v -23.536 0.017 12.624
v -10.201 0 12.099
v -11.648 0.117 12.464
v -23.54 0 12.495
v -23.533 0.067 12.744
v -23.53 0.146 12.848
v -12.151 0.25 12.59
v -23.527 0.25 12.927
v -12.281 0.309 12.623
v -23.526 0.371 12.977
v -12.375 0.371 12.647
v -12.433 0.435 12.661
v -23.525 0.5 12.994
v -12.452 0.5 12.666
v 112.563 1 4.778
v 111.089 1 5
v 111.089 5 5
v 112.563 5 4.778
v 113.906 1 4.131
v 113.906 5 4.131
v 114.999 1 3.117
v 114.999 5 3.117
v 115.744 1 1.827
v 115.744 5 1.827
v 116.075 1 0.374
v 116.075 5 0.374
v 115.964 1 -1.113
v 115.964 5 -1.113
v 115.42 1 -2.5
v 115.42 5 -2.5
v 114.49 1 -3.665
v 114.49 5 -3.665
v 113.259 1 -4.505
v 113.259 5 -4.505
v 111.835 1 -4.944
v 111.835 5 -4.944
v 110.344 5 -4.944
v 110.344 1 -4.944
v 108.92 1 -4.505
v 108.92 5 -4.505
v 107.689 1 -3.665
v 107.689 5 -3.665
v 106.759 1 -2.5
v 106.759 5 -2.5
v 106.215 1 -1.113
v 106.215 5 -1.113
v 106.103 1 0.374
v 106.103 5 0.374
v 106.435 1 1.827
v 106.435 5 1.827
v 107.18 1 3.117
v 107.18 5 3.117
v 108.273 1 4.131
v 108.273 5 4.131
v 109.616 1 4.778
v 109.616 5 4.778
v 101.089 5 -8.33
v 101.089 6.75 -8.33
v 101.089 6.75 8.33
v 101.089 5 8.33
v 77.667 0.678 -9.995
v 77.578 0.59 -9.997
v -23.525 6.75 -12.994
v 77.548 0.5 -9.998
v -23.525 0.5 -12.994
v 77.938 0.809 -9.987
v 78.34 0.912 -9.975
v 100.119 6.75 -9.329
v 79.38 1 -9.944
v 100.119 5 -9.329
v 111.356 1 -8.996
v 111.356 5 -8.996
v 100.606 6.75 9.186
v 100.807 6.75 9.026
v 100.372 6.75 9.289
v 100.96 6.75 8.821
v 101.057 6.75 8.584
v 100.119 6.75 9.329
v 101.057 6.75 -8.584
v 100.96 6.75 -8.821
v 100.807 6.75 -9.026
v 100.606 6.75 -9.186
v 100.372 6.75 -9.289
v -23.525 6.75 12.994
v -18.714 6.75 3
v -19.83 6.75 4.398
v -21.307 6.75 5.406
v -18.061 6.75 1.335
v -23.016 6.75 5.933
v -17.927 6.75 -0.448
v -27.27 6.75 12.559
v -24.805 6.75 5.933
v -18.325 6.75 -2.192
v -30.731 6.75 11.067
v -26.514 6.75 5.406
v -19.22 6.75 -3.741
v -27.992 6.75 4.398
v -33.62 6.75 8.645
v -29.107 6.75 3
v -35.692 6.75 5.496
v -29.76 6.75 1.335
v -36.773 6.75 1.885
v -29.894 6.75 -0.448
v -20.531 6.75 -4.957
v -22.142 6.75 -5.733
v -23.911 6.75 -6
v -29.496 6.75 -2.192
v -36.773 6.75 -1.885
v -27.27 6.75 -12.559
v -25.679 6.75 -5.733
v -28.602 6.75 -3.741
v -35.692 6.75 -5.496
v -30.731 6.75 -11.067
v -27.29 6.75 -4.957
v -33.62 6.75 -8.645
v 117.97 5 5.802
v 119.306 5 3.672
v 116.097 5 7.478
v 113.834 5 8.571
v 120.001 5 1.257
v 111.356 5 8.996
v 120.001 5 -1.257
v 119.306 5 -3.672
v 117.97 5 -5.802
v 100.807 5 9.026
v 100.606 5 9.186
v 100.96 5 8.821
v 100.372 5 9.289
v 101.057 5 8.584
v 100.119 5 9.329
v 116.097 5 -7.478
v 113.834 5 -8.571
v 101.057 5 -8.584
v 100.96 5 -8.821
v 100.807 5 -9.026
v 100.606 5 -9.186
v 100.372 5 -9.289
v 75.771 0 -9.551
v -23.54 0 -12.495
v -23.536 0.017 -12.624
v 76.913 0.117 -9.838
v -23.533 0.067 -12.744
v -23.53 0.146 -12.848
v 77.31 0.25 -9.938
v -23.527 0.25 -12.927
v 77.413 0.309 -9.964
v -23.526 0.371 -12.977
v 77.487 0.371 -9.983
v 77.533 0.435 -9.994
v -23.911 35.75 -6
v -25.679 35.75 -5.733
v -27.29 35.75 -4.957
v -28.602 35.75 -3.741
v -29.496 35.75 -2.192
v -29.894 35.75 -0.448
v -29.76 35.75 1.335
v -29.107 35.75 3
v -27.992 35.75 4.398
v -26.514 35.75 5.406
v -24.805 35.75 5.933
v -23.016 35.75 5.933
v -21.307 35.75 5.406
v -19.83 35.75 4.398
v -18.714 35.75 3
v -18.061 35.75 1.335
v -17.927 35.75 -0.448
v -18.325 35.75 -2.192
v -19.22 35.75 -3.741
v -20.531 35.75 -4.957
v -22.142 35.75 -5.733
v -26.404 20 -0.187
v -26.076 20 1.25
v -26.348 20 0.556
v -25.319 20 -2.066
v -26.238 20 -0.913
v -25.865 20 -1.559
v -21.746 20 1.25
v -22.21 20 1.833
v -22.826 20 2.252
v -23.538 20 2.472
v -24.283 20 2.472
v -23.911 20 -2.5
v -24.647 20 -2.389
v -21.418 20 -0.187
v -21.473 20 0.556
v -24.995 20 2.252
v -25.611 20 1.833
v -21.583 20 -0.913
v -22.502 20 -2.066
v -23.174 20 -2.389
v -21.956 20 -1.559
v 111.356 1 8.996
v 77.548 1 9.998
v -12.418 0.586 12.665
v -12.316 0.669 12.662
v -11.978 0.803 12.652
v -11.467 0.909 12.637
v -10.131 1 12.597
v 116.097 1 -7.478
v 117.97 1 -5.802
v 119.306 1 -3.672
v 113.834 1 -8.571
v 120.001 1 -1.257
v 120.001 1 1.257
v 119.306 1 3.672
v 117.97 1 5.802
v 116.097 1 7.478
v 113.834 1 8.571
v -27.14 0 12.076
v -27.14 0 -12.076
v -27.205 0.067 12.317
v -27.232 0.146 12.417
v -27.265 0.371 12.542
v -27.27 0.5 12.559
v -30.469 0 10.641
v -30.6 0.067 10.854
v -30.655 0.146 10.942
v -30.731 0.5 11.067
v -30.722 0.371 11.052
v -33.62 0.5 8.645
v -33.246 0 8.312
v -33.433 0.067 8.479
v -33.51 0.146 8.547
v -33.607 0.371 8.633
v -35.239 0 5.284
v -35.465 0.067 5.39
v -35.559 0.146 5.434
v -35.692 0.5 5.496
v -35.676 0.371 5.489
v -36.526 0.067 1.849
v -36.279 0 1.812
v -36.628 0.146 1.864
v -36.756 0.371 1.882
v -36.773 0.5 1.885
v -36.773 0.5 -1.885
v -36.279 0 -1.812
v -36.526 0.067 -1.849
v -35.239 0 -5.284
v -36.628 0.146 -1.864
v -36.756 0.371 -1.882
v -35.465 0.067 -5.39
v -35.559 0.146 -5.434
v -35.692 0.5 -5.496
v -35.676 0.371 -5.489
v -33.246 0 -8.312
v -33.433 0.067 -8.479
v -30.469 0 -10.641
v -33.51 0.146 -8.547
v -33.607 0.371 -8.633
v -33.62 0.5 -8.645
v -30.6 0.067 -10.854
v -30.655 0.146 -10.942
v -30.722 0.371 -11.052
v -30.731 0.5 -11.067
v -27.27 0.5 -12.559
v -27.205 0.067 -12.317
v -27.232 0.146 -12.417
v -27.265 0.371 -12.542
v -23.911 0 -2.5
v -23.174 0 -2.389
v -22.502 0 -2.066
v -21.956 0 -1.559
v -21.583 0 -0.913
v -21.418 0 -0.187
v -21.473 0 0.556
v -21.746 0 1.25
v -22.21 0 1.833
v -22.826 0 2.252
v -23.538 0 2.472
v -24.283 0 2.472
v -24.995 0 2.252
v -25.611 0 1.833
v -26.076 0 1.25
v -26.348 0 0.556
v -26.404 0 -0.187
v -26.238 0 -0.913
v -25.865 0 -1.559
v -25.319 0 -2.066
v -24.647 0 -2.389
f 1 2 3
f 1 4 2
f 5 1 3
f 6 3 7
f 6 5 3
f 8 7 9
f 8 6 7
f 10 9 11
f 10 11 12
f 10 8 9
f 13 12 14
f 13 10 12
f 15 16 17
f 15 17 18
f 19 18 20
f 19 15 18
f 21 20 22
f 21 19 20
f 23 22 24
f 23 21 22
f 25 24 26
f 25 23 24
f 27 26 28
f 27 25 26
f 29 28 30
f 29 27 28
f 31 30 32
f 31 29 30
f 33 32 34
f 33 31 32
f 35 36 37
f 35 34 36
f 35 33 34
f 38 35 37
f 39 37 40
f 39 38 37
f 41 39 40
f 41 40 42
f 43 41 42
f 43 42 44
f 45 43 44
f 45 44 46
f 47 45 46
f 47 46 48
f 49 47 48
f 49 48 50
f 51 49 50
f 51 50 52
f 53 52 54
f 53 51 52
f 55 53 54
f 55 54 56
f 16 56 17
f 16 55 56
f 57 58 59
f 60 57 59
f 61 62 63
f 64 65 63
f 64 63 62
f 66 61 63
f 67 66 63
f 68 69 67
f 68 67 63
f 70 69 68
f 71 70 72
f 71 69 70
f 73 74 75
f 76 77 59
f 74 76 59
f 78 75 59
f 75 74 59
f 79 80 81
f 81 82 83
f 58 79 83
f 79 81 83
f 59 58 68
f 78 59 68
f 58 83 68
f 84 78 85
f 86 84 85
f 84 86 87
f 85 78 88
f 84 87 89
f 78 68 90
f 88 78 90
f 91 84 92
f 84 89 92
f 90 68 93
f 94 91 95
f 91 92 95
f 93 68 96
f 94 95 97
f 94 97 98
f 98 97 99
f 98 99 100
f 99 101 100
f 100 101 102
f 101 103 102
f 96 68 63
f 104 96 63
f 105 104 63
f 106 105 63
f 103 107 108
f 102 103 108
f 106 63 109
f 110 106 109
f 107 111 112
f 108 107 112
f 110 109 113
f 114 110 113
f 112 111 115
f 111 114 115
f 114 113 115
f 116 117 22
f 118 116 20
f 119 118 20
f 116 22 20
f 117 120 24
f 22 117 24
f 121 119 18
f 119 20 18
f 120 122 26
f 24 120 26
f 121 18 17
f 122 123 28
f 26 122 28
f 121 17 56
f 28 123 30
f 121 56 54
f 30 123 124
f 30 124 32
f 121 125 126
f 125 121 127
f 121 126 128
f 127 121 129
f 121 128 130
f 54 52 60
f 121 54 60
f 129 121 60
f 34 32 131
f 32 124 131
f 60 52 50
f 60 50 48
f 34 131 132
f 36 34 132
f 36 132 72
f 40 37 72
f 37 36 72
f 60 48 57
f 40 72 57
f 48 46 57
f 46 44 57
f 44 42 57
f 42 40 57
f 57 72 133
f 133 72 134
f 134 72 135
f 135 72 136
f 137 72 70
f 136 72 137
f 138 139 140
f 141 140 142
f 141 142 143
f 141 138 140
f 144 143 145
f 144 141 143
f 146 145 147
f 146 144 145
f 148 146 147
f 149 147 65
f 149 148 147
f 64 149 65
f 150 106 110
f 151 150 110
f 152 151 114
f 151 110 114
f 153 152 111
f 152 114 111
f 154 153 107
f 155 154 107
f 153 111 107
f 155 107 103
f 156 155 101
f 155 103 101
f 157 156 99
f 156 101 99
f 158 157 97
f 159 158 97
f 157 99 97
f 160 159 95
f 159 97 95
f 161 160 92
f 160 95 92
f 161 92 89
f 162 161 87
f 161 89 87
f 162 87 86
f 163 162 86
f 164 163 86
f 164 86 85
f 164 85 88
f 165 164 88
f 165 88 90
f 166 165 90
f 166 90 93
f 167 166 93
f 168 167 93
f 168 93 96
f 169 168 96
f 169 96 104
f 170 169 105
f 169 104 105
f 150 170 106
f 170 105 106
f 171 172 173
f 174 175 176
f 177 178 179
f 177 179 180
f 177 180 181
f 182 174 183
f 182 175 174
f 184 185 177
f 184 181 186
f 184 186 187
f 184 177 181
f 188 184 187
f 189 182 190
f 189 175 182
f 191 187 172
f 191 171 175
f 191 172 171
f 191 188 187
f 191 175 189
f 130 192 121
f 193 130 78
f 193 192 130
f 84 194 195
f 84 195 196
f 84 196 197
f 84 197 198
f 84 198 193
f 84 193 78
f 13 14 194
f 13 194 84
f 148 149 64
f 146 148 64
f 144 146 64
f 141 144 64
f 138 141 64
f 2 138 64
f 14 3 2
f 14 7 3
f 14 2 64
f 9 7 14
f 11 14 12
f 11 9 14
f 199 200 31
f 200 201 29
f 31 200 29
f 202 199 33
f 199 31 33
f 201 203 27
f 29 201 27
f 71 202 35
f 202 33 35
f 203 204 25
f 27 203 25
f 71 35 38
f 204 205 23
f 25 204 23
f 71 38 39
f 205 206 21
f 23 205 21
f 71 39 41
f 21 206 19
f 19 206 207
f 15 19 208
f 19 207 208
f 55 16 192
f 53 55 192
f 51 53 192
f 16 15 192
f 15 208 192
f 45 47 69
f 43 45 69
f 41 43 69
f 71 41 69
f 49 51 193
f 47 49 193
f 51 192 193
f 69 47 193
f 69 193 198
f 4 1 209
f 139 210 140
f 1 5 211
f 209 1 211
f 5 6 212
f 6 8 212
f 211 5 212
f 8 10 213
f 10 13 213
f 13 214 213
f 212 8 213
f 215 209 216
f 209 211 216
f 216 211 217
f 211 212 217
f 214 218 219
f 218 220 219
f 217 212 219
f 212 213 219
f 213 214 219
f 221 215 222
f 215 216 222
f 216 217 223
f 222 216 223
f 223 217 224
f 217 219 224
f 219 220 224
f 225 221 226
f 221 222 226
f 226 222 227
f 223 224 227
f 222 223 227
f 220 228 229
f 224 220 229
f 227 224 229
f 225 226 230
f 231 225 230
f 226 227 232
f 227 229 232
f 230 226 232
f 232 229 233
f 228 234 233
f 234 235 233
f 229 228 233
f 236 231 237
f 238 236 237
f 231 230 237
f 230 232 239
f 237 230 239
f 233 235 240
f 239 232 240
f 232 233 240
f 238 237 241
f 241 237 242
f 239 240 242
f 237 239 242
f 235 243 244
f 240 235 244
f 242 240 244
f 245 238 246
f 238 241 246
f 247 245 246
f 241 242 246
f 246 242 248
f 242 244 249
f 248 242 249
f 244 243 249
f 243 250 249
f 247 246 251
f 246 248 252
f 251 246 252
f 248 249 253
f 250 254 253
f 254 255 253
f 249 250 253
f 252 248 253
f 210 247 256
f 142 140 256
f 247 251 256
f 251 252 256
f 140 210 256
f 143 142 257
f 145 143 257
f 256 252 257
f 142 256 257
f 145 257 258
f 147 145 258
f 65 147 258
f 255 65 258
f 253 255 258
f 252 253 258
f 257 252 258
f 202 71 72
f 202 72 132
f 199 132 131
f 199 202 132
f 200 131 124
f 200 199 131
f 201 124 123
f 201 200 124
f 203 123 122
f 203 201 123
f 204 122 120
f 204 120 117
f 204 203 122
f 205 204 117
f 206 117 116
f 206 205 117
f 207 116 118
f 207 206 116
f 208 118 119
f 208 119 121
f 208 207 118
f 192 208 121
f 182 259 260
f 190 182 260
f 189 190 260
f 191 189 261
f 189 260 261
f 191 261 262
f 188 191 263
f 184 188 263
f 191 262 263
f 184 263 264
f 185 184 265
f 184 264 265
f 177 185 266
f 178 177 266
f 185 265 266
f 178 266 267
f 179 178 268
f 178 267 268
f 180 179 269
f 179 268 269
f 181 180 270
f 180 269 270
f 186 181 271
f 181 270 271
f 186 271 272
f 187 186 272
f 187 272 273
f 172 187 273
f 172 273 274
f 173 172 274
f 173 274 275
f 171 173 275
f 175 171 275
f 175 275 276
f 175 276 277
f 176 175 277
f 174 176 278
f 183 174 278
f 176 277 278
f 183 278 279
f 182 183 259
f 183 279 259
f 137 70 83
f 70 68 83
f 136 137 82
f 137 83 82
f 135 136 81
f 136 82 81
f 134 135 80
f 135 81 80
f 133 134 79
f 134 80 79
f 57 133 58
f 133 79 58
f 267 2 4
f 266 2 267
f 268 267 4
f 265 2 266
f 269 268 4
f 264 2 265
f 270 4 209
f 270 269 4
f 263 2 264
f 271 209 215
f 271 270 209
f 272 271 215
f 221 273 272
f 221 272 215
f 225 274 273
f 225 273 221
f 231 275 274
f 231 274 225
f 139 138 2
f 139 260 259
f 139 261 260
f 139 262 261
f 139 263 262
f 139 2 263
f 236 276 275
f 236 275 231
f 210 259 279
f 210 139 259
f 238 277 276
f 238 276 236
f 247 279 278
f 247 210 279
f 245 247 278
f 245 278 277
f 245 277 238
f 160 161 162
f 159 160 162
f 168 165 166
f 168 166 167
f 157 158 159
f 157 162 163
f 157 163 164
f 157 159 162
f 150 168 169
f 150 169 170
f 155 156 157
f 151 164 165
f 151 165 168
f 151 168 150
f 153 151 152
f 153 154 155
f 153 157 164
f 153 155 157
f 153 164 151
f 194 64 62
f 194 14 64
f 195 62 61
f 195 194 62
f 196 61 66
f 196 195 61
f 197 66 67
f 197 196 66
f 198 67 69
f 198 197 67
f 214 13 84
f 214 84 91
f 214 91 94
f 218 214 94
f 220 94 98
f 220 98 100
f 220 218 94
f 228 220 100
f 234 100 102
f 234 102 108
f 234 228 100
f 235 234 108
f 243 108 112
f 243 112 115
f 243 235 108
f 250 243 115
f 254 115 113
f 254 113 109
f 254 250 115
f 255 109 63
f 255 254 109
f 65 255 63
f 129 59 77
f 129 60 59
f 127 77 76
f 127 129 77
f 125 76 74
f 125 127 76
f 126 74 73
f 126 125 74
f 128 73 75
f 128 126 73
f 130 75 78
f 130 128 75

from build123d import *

# Parameters (mm, degrees)
SKETCH2_R           = 5
BOSS_EXTRUDE1_DEPTH = 6.75
CUT_EXTRUDE2_DEPTH  = 1.75
FILLET1_R           = 1
CUT_EXTRUDE4_DEPTH  = 1
FILLET2_R           = 0.5
FILLET3_R           = 0.5
SKETCH10_R          = 6
BOSS_EXTRUDE2_DEPTH = 29
SKETCH11_R          = 2.5
CUT_EXTRUDE6_DEPTH  = 20


with BuildPart() as part:
    # Sketch2 → Boss-Extrude1 (new body)
    with BuildSketch(Plane(origin=(0, 0, 0), x_dir=(1, 0, 0), z_dir=(0, 1, 0))):
        with BuildLine():
            Line((-23.525392368, 12.9942923), (111.356089114, 8.996048515))
            ThreePointArc((111.356089114, 8.996048515), (120.089422447, 0), (111.356089114, -8.996048515))
            Line((111.356089114, -8.996048515), (-23.525392368, -12.9942923))
            ThreePointArc((-23.525392368, -12.9942923), (-36.910577553, 0), (-23.525392368, 12.9942923))
        make_face()
        with Locations(Location((111.089422447, 0, 0), (0, 0, 270))):
            Circle(SKETCH2_R, mode=Mode.SUBTRACT)
    extrude(amount=BOSS_EXTRUDE1_DEPTH)

    # Sketch6 → Cut-Extrude2 (cut)
    with BuildSketch(Plane(origin=(0, 6.75, 0), x_dir=(1, 0, 0), z_dir=(0, 1, 0))):
        Polygon((101.089422447, 0), (101.089422447, 15.957712546), (123.696181887, 15.957712546), (123.696181887, -15.662199351), (101.089422447, -15.662199351), align=None)
    extrude(amount=-CUT_EXTRUDE2_DEPTH, mode=Mode.SUBTRACT)

    # Fillet1
    fillet1_edges = [part.edges().sort_by_distance(p)[0] for p in [
        (101.089422447, 5.875, -9.300379664),
        (101.089422447, 5.875, 9.300379664),
    ]]
    fillet(fillet1_edges, radius=FILLET1_R)

    # Sketch9 → Cut-Extrude4 (cut)
    with BuildSketch(Plane.XZ):
        with BuildLine():
            Line((-12.452129788, 12.666051515), (77.547870212, 9.998213524))
            ThreePointArc((77.547870212, 9.998213524), (146.089422447, 0), (77.547870212, -9.998213524))
            Line((77.547870212, -9.998213524), (-12.452129788, 12.666051515))
        make_face()
    extrude(amount=-CUT_EXTRUDE4_DEPTH, mode=Mode.SUBTRACT)

    # Fillet2
    fillet2_edges = [part.edges().sort_by_distance(p)[0] for p in [
        (32.547870212, 1, 1.333918996),
    ]]
    fillet(fillet2_edges, radius=FILLET2_R)

    # Fillet3
    fillet3_edges = [part.edges().sort_by_distance(p)[0] for p in [
        (-17.988761078, 0, 12.830171908),
        (-36.910577553, 0, 0),
        (27.011238922, 0, -11.496252912),
    ]]
    fillet(fillet3_edges, radius=FILLET3_R)

    # Sketch10 → Boss-Extrude2 (add)
    with BuildSketch(Plane(origin=(0, 6.75, 0), x_dir=(1, 0, 0), z_dir=(0, 1, 0))):
        with Locations(Location((-23.910577553, 0, 0), (0, 0, 90))):
            Circle(SKETCH10_R)
    extrude(amount=BOSS_EXTRUDE2_DEPTH)

    # Sketch11 → Cut-Extrude6 (cut)
    with BuildSketch(Plane.XZ):
        with Locations(Location((-23.910577553, 0, 0), (0, 0, 270))):
            Circle(SKETCH11_R)
    extrude(amount=-CUT_EXTRUDE6_DEPTH, mode=Mode.SUBTRACT)


solid = part.part
